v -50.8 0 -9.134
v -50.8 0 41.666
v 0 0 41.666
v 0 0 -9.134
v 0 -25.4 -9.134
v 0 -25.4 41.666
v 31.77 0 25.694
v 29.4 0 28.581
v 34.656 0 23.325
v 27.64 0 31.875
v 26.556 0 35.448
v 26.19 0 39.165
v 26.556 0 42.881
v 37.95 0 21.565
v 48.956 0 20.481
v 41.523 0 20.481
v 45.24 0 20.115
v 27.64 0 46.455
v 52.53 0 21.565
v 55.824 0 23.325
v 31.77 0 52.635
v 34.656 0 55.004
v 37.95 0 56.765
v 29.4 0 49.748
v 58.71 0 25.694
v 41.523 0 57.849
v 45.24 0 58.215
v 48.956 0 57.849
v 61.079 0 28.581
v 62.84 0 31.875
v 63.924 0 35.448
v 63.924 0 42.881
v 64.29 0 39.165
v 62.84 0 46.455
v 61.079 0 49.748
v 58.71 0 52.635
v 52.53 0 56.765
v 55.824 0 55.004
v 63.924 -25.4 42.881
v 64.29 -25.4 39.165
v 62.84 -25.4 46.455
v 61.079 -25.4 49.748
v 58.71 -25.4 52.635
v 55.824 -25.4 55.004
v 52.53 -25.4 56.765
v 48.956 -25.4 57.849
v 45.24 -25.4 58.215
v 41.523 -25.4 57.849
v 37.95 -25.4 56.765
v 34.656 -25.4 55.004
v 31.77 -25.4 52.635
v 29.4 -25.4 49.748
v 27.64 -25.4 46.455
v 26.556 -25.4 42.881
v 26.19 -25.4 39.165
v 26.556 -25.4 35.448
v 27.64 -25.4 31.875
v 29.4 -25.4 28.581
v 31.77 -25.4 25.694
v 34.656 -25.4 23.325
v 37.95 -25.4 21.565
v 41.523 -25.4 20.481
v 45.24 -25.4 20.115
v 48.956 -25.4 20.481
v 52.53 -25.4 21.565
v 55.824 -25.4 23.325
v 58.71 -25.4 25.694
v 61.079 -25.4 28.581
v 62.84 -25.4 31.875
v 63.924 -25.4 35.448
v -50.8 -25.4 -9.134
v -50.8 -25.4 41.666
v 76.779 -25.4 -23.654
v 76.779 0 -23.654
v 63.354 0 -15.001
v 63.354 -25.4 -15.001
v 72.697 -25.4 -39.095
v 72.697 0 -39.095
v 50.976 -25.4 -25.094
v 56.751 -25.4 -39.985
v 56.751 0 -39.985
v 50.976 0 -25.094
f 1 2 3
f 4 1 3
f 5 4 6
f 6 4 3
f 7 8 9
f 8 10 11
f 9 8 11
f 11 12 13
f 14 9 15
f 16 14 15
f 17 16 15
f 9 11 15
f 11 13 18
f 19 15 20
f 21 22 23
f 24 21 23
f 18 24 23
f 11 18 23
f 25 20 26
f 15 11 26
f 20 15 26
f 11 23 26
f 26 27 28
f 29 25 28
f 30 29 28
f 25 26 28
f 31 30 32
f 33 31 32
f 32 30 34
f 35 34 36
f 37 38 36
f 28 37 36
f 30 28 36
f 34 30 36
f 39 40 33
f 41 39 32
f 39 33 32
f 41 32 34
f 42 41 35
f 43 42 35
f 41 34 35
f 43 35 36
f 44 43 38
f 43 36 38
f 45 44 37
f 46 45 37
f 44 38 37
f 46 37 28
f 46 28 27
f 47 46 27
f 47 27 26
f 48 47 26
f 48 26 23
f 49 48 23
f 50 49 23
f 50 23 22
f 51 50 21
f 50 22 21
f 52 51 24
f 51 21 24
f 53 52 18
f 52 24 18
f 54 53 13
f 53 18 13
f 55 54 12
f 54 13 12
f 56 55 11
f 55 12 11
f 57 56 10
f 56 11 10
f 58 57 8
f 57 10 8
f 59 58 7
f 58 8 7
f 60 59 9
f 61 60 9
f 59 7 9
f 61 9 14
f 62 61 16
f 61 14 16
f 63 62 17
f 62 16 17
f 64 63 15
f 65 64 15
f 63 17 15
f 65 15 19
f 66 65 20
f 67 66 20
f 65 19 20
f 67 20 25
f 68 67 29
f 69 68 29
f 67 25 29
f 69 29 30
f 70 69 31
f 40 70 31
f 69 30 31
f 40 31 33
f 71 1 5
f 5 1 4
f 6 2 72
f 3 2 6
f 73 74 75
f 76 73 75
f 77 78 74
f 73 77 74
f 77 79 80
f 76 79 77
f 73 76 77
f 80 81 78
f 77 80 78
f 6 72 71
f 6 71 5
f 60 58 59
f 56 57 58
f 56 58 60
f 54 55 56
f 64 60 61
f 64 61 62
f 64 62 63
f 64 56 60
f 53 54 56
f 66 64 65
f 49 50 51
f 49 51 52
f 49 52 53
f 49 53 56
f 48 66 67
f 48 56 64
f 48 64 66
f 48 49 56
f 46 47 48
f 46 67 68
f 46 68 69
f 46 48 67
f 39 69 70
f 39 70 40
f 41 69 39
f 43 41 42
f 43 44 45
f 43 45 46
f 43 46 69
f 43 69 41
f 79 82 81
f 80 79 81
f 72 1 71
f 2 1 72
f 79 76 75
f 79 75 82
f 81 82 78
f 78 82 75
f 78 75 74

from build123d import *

# Parameters (mm, degrees)
F0_W     = 50.8
F0_H     = 50.8
F0_R     = 19.05
F1_DEPTH = 25.4


with BuildPart() as f1:
    # F0 (on Front) → F1 (new body)
    with BuildSketch(Plane.XZ):
        with Locations((-25.4, 16.26601)):
            Rectangle(F0_W, F0_H)
        with Locations((45.239903, 39.16483)):
            Circle(F0_R)
        Polygon((72.697138, -39.095146), (76.778576, -23.654006), (63.354412, -15.000754), (50.976386, -25.09389), (56.750508, -39.985044), align=None)
    extrude(amount=F1_DEPTH)


solid = f1.part
